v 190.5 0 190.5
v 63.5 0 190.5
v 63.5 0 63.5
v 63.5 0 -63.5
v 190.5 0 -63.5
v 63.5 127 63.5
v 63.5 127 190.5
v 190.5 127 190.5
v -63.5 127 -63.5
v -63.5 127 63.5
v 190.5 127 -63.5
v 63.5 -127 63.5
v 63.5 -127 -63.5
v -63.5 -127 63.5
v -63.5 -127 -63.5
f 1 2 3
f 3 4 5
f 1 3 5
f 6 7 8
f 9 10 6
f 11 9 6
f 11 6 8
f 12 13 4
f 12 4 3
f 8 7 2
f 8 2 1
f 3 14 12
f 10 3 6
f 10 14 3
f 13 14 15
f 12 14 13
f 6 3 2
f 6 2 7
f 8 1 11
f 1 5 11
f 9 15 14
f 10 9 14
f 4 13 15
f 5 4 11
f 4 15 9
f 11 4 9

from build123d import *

# Parameters (mm, degrees)
F1_W     = 127
F1_H     = 127
F2_DEPTH = 127
F3_W     = 127
F3_H     = 127
F4_DEPTH = 127
F5_W     = 127
F5_H     = 127
F6_DEPTH = 127


# Not quite as in the source:
# - a variable given as a bare number and used for a length is read in inches; the dataset says mm whatever the document's units were


with BuildPart() as f2:
    # F1 (on Front) → F2 (new body, symmetric)
    with BuildSketch(Plane.XZ):
        Rectangle(F1_W, F1_H)
    extrude(amount=F2_DEPTH, both=True)

    # F3 (on face) → F4 (join)
    with BuildSketch(Plane.YZ.offset(63.5)):
        with Locations((63.5, 0)):
            Rectangle(F3_W, F3_H)
    extrude(amount=F4_DEPTH)

    # F5 (on face) → F6 (join)
    with BuildSketch(Plane.XY.offset(63.5)):
        with Locations((127, 63.5)):
            Rectangle(F5_W, F5_H)
    extrude(amount=F6_DEPTH)


solid = f2.part
